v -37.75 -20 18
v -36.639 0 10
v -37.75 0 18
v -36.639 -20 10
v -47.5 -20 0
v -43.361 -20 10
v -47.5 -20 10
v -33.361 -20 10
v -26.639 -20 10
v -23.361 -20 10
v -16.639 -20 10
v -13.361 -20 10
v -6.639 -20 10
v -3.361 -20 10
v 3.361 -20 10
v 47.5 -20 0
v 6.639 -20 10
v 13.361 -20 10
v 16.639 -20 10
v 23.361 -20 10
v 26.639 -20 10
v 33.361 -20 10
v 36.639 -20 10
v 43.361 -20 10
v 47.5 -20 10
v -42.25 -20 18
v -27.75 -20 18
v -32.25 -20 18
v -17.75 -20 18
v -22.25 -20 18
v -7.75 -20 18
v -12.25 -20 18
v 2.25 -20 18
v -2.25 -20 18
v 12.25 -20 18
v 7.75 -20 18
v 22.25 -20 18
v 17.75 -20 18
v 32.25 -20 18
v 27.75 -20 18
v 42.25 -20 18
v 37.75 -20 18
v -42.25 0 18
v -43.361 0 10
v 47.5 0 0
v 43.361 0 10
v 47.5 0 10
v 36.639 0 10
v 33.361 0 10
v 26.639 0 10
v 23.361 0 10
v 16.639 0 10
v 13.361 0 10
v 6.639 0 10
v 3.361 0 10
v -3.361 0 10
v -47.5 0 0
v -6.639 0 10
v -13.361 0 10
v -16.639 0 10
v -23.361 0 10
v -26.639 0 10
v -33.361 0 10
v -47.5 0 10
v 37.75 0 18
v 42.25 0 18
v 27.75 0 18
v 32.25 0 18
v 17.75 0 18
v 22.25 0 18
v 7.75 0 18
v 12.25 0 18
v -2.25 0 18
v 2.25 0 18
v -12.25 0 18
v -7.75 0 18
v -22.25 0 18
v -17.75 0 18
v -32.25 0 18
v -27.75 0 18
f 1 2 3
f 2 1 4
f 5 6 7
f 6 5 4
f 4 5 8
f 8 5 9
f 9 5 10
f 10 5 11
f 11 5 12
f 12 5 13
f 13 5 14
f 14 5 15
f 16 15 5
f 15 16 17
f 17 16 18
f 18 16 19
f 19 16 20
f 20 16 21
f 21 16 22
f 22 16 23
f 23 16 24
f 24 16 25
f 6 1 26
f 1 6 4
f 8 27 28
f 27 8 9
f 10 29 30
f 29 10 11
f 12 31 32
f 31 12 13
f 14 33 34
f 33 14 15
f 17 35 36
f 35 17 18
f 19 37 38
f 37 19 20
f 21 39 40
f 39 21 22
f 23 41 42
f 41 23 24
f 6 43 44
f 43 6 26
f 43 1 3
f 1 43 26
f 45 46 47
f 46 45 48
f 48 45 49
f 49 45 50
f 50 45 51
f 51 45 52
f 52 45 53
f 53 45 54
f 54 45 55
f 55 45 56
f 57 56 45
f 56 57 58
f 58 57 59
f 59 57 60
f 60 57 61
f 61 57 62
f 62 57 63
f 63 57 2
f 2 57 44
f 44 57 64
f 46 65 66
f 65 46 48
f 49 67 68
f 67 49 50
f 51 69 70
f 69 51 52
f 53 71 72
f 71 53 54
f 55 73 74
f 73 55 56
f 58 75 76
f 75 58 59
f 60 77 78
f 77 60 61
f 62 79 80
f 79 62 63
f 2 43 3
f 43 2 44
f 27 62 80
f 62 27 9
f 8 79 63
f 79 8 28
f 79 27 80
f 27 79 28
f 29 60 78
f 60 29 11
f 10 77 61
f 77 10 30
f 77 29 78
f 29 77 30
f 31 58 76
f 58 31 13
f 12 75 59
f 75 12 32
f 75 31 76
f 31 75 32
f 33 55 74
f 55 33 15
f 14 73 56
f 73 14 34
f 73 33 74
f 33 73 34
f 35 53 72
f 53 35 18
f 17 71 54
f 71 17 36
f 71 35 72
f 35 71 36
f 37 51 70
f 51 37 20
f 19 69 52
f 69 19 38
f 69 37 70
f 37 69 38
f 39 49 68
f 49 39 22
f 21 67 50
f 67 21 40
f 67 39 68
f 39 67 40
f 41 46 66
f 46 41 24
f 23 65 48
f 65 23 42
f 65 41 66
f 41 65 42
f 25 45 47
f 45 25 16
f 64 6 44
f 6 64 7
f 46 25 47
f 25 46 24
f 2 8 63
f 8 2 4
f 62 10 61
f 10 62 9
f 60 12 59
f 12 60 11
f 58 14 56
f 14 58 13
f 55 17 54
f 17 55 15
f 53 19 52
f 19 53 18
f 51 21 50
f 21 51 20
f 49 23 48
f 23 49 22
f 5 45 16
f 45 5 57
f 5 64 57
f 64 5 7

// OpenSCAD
$fn = 32;

// ----------------------------------------------------------------------
// Toothed rack, 9 teeth
// 10 mm pitch, 8 mm teeth
// ----------------------------------------------------------------------

// --- parameters (mm) ---
bar_w = 20;     // bar width (Y)
bar_h = 10;     // bar height (Z)
teeth = 9;      // number of teeth
pitch = 10;     // tooth pitch
tooth_h = 8;    // tooth height above the bar
root_w = 7;     // tooth width at the root
crest_w = 4.5;  // tooth width at the crest

// --- derived feature positions (mm) ---
span = (teeth - 1) * pitch;  // = 80   distance between the outer teeth
bar_l = span + root_w + 8;   // = 95   bar length: teeth plus 4 mm at each end
tooth_x = -span / 2;         // = -40   X of the first tooth
height = bar_h + tooth_h;    // = 18   overall height
feature_centers = [
  [tooth_x + 0 * pitch, -bar_w / 2],
  [tooth_x + 1 * pitch, -bar_w / 2],
  [tooth_x + 2 * pitch, -bar_w / 2],
  [tooth_x + 3 * pitch, -bar_w / 2],
  [tooth_x + 4 * pitch, -bar_w / 2],
  [tooth_x + 5 * pitch, -bar_w / 2],
  [tooth_x + 6 * pitch, -bar_w / 2],
  [tooth_x + 7 * pitch, -bar_w / 2],
  [tooth_x + 8 * pitch, -bar_w / 2]
];   // tooth centre line, drives the tooth loop

// bar with a rack of teeth, one extruded trapezoium per centre
module rack_tooth() {
  linear_extrude(height = bar_w)
    polygon(points = [
      [0, 0],
      [root_w, 0],
      [root_w / 2 + crest_w / 2, tooth_h + 1],
      [root_w / 2 - crest_w / 2, tooth_h + 1]
    ]);
}

union() {
  translate([-bar_l / 2, -bar_w, 0]) cube([bar_l, bar_w, bar_h]);
  for (centre = feature_centers)
    translate([centre[0] - root_w / 2, 0, bar_h - 1]) rotate([90, 0, 0]) rack_tooth();
}
